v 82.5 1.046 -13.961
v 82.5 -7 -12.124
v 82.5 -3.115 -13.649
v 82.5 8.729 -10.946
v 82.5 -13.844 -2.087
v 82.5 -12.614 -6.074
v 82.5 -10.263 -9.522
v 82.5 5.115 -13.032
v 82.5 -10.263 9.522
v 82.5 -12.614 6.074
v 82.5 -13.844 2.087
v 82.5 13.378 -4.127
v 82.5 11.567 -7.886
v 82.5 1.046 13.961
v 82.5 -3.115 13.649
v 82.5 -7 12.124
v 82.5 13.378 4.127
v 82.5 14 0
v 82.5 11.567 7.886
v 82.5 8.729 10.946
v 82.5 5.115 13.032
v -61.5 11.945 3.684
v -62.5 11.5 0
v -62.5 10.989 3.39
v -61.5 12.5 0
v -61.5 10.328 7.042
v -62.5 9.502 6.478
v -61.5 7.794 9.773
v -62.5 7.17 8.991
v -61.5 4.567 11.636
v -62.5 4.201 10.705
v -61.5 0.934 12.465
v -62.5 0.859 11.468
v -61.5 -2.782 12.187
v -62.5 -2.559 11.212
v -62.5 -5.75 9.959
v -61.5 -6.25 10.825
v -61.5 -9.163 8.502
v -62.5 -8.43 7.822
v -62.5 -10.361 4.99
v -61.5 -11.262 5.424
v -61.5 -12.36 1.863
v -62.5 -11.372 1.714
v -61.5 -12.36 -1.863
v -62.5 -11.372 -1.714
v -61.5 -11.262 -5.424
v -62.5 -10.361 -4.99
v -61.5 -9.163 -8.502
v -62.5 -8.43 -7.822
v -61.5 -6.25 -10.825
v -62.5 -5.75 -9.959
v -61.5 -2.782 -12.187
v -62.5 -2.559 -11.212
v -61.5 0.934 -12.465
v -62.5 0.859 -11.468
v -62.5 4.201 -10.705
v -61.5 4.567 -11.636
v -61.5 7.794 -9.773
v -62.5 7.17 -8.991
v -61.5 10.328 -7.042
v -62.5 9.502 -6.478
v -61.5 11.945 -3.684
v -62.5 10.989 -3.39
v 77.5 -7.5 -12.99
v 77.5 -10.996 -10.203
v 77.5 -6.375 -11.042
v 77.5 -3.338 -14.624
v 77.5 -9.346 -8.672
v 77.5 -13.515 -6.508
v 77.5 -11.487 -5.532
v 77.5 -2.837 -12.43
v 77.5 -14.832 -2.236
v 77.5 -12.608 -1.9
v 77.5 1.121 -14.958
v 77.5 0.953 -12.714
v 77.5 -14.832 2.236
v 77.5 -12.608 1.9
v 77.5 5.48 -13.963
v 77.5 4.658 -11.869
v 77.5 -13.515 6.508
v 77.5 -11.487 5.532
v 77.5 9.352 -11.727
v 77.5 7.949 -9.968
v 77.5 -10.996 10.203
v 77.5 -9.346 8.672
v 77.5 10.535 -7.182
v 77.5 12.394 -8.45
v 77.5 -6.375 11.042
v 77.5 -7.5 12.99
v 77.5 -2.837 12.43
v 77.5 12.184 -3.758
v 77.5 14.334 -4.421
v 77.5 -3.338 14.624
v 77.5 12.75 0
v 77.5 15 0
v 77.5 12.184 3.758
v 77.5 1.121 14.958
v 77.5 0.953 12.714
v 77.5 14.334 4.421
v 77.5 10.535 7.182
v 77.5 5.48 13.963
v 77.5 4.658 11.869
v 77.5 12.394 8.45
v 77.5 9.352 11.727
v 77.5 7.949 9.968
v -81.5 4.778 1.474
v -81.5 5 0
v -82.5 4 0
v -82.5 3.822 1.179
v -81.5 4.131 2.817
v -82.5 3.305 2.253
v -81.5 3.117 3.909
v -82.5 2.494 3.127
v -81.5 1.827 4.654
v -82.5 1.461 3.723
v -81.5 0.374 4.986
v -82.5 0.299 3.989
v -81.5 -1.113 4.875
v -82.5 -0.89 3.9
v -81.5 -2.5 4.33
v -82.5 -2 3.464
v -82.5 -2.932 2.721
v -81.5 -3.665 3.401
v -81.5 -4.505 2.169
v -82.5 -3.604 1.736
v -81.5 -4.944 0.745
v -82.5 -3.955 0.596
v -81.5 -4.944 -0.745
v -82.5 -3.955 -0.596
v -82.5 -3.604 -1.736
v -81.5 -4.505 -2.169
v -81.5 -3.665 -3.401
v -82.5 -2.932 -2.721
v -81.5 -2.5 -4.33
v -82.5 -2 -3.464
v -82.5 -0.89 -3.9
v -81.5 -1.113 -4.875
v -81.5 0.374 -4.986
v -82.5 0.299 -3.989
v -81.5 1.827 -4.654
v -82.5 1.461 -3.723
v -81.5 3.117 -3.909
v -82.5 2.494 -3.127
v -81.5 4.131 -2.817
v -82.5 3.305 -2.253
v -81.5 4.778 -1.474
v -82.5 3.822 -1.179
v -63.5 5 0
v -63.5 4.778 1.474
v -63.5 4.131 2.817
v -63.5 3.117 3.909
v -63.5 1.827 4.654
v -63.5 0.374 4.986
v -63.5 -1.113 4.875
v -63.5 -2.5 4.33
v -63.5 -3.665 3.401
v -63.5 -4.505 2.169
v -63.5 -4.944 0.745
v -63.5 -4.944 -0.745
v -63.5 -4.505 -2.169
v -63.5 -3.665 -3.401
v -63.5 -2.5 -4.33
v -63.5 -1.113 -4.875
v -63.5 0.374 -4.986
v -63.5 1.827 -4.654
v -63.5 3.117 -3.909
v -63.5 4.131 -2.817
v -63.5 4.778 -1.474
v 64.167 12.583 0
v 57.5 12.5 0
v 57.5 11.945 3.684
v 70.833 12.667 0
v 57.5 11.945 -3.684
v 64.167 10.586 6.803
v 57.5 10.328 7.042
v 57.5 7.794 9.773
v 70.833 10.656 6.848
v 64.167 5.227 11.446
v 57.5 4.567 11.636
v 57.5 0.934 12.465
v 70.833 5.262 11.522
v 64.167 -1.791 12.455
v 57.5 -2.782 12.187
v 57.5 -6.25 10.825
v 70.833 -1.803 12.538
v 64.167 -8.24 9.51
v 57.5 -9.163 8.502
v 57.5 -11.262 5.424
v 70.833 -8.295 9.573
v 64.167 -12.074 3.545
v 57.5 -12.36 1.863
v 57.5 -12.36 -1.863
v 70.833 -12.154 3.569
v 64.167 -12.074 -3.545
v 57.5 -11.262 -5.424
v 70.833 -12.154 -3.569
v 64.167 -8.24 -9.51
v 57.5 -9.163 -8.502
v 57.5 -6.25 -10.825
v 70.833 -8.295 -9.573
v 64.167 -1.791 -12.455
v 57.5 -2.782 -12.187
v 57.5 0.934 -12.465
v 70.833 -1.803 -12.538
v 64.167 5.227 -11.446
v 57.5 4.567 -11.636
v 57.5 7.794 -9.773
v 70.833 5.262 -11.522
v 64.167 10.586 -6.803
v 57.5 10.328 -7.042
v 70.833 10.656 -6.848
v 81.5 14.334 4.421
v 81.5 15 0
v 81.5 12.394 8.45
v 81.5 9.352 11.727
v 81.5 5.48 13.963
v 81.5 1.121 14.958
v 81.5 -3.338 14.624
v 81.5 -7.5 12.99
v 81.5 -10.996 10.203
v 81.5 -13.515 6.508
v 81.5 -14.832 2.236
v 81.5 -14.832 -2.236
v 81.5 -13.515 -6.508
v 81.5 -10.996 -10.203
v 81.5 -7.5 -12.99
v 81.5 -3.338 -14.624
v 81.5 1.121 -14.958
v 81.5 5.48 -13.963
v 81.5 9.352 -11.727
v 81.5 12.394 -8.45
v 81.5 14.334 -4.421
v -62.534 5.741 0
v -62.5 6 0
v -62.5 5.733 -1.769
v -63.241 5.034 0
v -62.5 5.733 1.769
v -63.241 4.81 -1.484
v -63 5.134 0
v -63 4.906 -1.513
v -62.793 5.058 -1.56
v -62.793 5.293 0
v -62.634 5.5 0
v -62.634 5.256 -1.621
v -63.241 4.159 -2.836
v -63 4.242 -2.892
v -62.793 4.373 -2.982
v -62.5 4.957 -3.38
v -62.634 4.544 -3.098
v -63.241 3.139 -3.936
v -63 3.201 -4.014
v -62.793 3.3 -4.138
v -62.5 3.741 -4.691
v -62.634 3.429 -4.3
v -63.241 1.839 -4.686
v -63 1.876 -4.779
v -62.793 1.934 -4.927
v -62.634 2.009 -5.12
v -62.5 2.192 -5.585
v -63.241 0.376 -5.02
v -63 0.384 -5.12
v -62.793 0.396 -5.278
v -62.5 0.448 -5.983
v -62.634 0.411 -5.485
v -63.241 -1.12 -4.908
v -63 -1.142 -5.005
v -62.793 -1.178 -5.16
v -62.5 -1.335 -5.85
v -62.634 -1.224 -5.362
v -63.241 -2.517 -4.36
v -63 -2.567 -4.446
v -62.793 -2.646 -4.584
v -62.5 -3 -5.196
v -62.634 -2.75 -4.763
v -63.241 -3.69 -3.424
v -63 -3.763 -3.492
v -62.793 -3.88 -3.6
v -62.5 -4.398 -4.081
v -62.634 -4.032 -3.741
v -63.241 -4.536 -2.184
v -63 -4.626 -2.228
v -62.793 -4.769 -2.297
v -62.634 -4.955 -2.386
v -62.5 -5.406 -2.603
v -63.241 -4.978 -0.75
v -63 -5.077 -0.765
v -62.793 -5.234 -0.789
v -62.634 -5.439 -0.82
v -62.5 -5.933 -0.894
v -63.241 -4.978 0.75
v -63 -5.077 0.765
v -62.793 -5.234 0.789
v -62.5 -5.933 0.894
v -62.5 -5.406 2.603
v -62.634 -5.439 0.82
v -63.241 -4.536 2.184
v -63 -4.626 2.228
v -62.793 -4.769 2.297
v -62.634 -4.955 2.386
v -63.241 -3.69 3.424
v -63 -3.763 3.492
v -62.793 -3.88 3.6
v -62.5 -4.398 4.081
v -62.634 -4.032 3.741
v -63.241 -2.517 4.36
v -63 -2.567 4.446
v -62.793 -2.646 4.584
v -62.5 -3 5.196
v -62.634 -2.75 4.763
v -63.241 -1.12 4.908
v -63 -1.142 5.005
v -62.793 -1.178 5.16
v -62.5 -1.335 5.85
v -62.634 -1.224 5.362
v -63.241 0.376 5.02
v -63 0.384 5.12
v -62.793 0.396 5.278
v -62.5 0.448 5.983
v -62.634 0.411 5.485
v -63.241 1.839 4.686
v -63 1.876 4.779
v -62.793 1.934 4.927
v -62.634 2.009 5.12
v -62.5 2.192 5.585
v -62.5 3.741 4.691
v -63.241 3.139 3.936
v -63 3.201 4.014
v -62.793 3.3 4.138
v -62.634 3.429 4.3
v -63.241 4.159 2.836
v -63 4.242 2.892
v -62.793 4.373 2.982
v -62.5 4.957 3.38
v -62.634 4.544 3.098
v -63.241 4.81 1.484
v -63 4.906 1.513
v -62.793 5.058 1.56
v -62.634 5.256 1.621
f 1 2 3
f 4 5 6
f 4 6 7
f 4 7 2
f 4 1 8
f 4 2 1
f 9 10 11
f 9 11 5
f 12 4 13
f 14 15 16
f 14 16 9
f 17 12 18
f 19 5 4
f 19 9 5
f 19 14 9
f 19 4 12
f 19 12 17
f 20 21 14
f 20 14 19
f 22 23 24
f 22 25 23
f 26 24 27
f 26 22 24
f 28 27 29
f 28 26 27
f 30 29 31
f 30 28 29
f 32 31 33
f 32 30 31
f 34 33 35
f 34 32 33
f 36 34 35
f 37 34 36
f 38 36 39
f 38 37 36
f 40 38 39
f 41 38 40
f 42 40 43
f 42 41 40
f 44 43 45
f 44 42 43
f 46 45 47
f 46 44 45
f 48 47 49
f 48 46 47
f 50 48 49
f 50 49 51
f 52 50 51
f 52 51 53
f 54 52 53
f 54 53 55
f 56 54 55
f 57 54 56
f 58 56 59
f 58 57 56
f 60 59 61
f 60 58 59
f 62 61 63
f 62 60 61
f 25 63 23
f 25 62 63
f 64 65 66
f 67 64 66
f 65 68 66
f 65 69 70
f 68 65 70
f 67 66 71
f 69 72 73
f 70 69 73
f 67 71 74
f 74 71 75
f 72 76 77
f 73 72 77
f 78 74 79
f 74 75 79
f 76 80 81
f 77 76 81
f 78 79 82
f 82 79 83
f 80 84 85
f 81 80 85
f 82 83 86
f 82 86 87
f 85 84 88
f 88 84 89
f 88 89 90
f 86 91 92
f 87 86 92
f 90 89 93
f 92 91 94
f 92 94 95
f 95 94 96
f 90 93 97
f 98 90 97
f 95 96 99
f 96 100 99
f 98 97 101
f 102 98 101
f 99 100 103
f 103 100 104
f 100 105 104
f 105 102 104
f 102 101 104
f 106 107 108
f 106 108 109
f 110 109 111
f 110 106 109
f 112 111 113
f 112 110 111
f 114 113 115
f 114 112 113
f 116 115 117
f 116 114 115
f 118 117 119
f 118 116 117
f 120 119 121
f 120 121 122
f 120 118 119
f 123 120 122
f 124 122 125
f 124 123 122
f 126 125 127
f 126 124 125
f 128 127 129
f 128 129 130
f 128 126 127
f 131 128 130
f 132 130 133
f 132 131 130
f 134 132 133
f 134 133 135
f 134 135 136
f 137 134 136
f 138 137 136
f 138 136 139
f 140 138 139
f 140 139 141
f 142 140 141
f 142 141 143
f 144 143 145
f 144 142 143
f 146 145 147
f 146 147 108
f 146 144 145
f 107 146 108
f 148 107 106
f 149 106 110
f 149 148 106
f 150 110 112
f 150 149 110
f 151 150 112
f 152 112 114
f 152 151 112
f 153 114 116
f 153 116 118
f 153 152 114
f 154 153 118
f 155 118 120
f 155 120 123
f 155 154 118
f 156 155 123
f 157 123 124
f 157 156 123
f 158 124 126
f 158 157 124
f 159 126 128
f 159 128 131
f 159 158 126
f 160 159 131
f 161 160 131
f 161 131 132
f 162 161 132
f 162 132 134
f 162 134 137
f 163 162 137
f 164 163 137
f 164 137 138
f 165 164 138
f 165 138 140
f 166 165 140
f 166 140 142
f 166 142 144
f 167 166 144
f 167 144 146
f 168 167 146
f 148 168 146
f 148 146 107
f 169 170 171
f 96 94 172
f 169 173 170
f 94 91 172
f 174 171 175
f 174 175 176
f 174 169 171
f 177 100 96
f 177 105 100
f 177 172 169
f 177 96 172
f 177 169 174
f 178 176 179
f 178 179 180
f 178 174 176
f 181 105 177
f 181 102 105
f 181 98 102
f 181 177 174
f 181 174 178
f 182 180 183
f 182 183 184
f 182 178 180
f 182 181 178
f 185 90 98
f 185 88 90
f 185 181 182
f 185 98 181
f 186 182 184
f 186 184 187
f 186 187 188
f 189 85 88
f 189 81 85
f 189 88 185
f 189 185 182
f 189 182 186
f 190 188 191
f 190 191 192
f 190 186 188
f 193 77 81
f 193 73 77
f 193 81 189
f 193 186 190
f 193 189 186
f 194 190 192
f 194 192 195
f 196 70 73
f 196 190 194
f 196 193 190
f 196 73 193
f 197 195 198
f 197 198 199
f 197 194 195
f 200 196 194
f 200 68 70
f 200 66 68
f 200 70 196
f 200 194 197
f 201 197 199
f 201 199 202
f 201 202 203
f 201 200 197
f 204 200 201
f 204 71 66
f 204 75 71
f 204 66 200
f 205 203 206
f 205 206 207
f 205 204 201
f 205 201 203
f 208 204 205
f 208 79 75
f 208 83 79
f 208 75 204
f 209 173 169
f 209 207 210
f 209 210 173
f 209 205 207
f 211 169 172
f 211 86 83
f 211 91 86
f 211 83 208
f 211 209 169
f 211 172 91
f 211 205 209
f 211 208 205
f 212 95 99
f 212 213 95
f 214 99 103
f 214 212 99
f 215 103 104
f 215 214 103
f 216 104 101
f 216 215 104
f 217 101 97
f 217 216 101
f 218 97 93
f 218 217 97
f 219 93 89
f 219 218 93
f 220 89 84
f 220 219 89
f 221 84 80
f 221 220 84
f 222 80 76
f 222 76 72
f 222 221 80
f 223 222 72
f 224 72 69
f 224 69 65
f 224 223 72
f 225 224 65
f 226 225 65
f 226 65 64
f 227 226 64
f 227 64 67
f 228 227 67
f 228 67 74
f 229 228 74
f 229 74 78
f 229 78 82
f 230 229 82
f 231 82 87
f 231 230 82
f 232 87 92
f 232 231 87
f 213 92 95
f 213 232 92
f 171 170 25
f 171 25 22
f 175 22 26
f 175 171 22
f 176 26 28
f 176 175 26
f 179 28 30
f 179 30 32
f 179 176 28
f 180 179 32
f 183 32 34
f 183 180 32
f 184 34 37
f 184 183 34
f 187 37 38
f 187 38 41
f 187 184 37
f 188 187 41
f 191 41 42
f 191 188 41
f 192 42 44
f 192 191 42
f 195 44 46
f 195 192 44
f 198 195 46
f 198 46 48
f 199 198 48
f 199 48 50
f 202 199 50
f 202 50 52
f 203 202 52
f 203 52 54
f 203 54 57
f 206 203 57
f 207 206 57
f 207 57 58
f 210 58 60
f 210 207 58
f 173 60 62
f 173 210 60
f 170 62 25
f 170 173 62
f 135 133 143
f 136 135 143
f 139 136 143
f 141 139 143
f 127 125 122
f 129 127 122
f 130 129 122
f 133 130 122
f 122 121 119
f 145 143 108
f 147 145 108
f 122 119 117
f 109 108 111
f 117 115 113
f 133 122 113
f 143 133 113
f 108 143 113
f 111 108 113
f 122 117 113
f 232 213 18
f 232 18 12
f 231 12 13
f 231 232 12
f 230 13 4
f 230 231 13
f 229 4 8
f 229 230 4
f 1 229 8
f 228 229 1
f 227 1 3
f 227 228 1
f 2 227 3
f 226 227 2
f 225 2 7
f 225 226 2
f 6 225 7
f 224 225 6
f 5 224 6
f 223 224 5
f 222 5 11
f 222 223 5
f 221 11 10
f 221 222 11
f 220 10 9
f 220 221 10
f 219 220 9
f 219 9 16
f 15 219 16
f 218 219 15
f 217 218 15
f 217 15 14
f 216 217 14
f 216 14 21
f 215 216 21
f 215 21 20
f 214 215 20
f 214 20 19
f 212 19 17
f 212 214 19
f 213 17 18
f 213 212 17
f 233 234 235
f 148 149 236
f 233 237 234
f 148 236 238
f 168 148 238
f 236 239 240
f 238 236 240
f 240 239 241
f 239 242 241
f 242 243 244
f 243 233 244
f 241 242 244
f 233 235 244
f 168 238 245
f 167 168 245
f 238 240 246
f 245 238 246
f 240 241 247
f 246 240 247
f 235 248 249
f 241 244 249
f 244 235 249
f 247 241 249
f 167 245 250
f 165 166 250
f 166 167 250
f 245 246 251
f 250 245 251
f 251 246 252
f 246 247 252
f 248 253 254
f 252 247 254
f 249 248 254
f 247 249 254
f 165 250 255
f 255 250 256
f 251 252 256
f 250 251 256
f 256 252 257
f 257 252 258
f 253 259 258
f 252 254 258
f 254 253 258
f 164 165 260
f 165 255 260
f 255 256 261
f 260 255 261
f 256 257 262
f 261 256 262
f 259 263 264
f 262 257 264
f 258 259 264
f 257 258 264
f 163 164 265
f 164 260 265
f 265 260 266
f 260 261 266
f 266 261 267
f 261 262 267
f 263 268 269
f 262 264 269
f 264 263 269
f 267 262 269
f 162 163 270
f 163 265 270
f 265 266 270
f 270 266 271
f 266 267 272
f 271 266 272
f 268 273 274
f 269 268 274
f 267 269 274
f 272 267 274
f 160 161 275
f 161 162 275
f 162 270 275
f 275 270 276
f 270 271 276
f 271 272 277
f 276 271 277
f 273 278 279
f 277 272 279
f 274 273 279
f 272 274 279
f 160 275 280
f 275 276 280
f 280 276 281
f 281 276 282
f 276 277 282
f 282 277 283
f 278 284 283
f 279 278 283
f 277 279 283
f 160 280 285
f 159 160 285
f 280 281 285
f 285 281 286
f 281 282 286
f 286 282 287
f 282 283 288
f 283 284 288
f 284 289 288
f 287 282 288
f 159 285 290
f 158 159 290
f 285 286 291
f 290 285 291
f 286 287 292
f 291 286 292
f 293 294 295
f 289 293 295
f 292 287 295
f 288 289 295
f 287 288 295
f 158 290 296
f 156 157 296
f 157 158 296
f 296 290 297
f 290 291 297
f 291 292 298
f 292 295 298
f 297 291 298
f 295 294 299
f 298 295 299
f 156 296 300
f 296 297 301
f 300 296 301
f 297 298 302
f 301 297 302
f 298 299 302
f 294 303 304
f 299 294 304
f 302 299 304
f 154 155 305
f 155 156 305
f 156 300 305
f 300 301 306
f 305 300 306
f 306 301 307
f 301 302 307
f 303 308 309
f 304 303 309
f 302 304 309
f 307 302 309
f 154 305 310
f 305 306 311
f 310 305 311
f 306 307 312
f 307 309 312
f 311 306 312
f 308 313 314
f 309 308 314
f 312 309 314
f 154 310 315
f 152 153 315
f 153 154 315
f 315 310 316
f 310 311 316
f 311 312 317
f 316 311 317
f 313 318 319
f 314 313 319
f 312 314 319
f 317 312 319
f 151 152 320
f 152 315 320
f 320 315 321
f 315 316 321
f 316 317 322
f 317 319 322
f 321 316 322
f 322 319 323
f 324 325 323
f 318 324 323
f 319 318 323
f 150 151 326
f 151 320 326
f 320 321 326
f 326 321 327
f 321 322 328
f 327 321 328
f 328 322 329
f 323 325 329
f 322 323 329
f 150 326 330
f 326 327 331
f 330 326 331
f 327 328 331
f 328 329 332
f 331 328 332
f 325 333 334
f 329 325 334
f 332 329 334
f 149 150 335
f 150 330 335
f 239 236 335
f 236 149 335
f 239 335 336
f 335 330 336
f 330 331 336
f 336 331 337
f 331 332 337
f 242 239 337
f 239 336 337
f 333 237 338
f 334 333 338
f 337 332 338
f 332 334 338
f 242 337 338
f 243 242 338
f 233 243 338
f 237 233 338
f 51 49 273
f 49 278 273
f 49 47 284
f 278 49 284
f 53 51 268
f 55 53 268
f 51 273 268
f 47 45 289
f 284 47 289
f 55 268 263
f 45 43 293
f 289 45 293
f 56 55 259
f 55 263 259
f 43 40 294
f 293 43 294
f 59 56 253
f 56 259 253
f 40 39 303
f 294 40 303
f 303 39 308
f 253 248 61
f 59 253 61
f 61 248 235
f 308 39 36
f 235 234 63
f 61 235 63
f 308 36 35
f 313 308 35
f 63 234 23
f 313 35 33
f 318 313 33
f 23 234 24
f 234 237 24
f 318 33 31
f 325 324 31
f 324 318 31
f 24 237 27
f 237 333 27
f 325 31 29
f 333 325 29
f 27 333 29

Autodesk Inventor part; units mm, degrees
ref_plane "YZ Plane" through (0, 0, 0) normal (1, 0, 0) x (0, 1, 0)
ref_plane "XZ Plane" through (0, 0, 0) normal (0, 1, 0) x (-1, 0, 0)
ref_plane "XY Plane" through (0, 0, 0) normal (0, 0, 1) x (1, 0, 0)
sketch "Sketch1" plane through (0, 0, 0) normal (0, 0, 1) x (1, 0, 0)
  line L0 (-82.5, 0) -> (82.5, 0)
  line L1 (-82.5, 0) -> (-82.5, 12.5)
  line L2 (-82.5, 12.5) -> (77.5, 12.5)
  line L3 (77.5, 12.5) -> (77.5, 15)
  line L4 (77.5, 15) -> (82.5, 15)
  line L5 (82.5, 15) -> (82.5, 0)
  circle A0 centre (-72.5, 0) radius 1.75
  line L6 (77.5, 12.75) -> (57.5, 12.5)
  line L7 (-82.5, 5) -> (-62.5, 5)
  line L8 (-62.5, 5) -> (-62.5, 12.5)
  point P0 (0, 0)
  point P1 (0, 0)
  dimension "d0" = 165
  dimension "d1" = 25
  dimension "d2" = 5
  dimension "d3" = 30
  dimension "d8" = 3.5
  dimension "d9" = 10
  dimension "d12" = 0.25
  dimension "d13" = 20
  dimension "d14" = 10
  dimension "d15" = 20
revolve "Revolution1" add sketch "Sketch1" angle 360 about axis through (-82.5, 0, 0) along (1, 0, 0) picked at (-71.9665, 0.4107) contours A0 L0 L1 L7 L8 L2 L3 L4 L5 | L0 A0 | L3 L2 L6
fillet "Fillet1" radius 1 1 edges at (-62.5, -5, 0)
thread "Thread1" size "M10x1.5" class "6g" standard "ISO Metric profile" full length
chamfer "Chamfer1" distance 1 angle 45 3 edges at (82.5, -15, 0) (-62.5, -12.5, 0) (-82.5, -5, 0)
properties part number "PWTR-0111" material "Stainless Steel"
